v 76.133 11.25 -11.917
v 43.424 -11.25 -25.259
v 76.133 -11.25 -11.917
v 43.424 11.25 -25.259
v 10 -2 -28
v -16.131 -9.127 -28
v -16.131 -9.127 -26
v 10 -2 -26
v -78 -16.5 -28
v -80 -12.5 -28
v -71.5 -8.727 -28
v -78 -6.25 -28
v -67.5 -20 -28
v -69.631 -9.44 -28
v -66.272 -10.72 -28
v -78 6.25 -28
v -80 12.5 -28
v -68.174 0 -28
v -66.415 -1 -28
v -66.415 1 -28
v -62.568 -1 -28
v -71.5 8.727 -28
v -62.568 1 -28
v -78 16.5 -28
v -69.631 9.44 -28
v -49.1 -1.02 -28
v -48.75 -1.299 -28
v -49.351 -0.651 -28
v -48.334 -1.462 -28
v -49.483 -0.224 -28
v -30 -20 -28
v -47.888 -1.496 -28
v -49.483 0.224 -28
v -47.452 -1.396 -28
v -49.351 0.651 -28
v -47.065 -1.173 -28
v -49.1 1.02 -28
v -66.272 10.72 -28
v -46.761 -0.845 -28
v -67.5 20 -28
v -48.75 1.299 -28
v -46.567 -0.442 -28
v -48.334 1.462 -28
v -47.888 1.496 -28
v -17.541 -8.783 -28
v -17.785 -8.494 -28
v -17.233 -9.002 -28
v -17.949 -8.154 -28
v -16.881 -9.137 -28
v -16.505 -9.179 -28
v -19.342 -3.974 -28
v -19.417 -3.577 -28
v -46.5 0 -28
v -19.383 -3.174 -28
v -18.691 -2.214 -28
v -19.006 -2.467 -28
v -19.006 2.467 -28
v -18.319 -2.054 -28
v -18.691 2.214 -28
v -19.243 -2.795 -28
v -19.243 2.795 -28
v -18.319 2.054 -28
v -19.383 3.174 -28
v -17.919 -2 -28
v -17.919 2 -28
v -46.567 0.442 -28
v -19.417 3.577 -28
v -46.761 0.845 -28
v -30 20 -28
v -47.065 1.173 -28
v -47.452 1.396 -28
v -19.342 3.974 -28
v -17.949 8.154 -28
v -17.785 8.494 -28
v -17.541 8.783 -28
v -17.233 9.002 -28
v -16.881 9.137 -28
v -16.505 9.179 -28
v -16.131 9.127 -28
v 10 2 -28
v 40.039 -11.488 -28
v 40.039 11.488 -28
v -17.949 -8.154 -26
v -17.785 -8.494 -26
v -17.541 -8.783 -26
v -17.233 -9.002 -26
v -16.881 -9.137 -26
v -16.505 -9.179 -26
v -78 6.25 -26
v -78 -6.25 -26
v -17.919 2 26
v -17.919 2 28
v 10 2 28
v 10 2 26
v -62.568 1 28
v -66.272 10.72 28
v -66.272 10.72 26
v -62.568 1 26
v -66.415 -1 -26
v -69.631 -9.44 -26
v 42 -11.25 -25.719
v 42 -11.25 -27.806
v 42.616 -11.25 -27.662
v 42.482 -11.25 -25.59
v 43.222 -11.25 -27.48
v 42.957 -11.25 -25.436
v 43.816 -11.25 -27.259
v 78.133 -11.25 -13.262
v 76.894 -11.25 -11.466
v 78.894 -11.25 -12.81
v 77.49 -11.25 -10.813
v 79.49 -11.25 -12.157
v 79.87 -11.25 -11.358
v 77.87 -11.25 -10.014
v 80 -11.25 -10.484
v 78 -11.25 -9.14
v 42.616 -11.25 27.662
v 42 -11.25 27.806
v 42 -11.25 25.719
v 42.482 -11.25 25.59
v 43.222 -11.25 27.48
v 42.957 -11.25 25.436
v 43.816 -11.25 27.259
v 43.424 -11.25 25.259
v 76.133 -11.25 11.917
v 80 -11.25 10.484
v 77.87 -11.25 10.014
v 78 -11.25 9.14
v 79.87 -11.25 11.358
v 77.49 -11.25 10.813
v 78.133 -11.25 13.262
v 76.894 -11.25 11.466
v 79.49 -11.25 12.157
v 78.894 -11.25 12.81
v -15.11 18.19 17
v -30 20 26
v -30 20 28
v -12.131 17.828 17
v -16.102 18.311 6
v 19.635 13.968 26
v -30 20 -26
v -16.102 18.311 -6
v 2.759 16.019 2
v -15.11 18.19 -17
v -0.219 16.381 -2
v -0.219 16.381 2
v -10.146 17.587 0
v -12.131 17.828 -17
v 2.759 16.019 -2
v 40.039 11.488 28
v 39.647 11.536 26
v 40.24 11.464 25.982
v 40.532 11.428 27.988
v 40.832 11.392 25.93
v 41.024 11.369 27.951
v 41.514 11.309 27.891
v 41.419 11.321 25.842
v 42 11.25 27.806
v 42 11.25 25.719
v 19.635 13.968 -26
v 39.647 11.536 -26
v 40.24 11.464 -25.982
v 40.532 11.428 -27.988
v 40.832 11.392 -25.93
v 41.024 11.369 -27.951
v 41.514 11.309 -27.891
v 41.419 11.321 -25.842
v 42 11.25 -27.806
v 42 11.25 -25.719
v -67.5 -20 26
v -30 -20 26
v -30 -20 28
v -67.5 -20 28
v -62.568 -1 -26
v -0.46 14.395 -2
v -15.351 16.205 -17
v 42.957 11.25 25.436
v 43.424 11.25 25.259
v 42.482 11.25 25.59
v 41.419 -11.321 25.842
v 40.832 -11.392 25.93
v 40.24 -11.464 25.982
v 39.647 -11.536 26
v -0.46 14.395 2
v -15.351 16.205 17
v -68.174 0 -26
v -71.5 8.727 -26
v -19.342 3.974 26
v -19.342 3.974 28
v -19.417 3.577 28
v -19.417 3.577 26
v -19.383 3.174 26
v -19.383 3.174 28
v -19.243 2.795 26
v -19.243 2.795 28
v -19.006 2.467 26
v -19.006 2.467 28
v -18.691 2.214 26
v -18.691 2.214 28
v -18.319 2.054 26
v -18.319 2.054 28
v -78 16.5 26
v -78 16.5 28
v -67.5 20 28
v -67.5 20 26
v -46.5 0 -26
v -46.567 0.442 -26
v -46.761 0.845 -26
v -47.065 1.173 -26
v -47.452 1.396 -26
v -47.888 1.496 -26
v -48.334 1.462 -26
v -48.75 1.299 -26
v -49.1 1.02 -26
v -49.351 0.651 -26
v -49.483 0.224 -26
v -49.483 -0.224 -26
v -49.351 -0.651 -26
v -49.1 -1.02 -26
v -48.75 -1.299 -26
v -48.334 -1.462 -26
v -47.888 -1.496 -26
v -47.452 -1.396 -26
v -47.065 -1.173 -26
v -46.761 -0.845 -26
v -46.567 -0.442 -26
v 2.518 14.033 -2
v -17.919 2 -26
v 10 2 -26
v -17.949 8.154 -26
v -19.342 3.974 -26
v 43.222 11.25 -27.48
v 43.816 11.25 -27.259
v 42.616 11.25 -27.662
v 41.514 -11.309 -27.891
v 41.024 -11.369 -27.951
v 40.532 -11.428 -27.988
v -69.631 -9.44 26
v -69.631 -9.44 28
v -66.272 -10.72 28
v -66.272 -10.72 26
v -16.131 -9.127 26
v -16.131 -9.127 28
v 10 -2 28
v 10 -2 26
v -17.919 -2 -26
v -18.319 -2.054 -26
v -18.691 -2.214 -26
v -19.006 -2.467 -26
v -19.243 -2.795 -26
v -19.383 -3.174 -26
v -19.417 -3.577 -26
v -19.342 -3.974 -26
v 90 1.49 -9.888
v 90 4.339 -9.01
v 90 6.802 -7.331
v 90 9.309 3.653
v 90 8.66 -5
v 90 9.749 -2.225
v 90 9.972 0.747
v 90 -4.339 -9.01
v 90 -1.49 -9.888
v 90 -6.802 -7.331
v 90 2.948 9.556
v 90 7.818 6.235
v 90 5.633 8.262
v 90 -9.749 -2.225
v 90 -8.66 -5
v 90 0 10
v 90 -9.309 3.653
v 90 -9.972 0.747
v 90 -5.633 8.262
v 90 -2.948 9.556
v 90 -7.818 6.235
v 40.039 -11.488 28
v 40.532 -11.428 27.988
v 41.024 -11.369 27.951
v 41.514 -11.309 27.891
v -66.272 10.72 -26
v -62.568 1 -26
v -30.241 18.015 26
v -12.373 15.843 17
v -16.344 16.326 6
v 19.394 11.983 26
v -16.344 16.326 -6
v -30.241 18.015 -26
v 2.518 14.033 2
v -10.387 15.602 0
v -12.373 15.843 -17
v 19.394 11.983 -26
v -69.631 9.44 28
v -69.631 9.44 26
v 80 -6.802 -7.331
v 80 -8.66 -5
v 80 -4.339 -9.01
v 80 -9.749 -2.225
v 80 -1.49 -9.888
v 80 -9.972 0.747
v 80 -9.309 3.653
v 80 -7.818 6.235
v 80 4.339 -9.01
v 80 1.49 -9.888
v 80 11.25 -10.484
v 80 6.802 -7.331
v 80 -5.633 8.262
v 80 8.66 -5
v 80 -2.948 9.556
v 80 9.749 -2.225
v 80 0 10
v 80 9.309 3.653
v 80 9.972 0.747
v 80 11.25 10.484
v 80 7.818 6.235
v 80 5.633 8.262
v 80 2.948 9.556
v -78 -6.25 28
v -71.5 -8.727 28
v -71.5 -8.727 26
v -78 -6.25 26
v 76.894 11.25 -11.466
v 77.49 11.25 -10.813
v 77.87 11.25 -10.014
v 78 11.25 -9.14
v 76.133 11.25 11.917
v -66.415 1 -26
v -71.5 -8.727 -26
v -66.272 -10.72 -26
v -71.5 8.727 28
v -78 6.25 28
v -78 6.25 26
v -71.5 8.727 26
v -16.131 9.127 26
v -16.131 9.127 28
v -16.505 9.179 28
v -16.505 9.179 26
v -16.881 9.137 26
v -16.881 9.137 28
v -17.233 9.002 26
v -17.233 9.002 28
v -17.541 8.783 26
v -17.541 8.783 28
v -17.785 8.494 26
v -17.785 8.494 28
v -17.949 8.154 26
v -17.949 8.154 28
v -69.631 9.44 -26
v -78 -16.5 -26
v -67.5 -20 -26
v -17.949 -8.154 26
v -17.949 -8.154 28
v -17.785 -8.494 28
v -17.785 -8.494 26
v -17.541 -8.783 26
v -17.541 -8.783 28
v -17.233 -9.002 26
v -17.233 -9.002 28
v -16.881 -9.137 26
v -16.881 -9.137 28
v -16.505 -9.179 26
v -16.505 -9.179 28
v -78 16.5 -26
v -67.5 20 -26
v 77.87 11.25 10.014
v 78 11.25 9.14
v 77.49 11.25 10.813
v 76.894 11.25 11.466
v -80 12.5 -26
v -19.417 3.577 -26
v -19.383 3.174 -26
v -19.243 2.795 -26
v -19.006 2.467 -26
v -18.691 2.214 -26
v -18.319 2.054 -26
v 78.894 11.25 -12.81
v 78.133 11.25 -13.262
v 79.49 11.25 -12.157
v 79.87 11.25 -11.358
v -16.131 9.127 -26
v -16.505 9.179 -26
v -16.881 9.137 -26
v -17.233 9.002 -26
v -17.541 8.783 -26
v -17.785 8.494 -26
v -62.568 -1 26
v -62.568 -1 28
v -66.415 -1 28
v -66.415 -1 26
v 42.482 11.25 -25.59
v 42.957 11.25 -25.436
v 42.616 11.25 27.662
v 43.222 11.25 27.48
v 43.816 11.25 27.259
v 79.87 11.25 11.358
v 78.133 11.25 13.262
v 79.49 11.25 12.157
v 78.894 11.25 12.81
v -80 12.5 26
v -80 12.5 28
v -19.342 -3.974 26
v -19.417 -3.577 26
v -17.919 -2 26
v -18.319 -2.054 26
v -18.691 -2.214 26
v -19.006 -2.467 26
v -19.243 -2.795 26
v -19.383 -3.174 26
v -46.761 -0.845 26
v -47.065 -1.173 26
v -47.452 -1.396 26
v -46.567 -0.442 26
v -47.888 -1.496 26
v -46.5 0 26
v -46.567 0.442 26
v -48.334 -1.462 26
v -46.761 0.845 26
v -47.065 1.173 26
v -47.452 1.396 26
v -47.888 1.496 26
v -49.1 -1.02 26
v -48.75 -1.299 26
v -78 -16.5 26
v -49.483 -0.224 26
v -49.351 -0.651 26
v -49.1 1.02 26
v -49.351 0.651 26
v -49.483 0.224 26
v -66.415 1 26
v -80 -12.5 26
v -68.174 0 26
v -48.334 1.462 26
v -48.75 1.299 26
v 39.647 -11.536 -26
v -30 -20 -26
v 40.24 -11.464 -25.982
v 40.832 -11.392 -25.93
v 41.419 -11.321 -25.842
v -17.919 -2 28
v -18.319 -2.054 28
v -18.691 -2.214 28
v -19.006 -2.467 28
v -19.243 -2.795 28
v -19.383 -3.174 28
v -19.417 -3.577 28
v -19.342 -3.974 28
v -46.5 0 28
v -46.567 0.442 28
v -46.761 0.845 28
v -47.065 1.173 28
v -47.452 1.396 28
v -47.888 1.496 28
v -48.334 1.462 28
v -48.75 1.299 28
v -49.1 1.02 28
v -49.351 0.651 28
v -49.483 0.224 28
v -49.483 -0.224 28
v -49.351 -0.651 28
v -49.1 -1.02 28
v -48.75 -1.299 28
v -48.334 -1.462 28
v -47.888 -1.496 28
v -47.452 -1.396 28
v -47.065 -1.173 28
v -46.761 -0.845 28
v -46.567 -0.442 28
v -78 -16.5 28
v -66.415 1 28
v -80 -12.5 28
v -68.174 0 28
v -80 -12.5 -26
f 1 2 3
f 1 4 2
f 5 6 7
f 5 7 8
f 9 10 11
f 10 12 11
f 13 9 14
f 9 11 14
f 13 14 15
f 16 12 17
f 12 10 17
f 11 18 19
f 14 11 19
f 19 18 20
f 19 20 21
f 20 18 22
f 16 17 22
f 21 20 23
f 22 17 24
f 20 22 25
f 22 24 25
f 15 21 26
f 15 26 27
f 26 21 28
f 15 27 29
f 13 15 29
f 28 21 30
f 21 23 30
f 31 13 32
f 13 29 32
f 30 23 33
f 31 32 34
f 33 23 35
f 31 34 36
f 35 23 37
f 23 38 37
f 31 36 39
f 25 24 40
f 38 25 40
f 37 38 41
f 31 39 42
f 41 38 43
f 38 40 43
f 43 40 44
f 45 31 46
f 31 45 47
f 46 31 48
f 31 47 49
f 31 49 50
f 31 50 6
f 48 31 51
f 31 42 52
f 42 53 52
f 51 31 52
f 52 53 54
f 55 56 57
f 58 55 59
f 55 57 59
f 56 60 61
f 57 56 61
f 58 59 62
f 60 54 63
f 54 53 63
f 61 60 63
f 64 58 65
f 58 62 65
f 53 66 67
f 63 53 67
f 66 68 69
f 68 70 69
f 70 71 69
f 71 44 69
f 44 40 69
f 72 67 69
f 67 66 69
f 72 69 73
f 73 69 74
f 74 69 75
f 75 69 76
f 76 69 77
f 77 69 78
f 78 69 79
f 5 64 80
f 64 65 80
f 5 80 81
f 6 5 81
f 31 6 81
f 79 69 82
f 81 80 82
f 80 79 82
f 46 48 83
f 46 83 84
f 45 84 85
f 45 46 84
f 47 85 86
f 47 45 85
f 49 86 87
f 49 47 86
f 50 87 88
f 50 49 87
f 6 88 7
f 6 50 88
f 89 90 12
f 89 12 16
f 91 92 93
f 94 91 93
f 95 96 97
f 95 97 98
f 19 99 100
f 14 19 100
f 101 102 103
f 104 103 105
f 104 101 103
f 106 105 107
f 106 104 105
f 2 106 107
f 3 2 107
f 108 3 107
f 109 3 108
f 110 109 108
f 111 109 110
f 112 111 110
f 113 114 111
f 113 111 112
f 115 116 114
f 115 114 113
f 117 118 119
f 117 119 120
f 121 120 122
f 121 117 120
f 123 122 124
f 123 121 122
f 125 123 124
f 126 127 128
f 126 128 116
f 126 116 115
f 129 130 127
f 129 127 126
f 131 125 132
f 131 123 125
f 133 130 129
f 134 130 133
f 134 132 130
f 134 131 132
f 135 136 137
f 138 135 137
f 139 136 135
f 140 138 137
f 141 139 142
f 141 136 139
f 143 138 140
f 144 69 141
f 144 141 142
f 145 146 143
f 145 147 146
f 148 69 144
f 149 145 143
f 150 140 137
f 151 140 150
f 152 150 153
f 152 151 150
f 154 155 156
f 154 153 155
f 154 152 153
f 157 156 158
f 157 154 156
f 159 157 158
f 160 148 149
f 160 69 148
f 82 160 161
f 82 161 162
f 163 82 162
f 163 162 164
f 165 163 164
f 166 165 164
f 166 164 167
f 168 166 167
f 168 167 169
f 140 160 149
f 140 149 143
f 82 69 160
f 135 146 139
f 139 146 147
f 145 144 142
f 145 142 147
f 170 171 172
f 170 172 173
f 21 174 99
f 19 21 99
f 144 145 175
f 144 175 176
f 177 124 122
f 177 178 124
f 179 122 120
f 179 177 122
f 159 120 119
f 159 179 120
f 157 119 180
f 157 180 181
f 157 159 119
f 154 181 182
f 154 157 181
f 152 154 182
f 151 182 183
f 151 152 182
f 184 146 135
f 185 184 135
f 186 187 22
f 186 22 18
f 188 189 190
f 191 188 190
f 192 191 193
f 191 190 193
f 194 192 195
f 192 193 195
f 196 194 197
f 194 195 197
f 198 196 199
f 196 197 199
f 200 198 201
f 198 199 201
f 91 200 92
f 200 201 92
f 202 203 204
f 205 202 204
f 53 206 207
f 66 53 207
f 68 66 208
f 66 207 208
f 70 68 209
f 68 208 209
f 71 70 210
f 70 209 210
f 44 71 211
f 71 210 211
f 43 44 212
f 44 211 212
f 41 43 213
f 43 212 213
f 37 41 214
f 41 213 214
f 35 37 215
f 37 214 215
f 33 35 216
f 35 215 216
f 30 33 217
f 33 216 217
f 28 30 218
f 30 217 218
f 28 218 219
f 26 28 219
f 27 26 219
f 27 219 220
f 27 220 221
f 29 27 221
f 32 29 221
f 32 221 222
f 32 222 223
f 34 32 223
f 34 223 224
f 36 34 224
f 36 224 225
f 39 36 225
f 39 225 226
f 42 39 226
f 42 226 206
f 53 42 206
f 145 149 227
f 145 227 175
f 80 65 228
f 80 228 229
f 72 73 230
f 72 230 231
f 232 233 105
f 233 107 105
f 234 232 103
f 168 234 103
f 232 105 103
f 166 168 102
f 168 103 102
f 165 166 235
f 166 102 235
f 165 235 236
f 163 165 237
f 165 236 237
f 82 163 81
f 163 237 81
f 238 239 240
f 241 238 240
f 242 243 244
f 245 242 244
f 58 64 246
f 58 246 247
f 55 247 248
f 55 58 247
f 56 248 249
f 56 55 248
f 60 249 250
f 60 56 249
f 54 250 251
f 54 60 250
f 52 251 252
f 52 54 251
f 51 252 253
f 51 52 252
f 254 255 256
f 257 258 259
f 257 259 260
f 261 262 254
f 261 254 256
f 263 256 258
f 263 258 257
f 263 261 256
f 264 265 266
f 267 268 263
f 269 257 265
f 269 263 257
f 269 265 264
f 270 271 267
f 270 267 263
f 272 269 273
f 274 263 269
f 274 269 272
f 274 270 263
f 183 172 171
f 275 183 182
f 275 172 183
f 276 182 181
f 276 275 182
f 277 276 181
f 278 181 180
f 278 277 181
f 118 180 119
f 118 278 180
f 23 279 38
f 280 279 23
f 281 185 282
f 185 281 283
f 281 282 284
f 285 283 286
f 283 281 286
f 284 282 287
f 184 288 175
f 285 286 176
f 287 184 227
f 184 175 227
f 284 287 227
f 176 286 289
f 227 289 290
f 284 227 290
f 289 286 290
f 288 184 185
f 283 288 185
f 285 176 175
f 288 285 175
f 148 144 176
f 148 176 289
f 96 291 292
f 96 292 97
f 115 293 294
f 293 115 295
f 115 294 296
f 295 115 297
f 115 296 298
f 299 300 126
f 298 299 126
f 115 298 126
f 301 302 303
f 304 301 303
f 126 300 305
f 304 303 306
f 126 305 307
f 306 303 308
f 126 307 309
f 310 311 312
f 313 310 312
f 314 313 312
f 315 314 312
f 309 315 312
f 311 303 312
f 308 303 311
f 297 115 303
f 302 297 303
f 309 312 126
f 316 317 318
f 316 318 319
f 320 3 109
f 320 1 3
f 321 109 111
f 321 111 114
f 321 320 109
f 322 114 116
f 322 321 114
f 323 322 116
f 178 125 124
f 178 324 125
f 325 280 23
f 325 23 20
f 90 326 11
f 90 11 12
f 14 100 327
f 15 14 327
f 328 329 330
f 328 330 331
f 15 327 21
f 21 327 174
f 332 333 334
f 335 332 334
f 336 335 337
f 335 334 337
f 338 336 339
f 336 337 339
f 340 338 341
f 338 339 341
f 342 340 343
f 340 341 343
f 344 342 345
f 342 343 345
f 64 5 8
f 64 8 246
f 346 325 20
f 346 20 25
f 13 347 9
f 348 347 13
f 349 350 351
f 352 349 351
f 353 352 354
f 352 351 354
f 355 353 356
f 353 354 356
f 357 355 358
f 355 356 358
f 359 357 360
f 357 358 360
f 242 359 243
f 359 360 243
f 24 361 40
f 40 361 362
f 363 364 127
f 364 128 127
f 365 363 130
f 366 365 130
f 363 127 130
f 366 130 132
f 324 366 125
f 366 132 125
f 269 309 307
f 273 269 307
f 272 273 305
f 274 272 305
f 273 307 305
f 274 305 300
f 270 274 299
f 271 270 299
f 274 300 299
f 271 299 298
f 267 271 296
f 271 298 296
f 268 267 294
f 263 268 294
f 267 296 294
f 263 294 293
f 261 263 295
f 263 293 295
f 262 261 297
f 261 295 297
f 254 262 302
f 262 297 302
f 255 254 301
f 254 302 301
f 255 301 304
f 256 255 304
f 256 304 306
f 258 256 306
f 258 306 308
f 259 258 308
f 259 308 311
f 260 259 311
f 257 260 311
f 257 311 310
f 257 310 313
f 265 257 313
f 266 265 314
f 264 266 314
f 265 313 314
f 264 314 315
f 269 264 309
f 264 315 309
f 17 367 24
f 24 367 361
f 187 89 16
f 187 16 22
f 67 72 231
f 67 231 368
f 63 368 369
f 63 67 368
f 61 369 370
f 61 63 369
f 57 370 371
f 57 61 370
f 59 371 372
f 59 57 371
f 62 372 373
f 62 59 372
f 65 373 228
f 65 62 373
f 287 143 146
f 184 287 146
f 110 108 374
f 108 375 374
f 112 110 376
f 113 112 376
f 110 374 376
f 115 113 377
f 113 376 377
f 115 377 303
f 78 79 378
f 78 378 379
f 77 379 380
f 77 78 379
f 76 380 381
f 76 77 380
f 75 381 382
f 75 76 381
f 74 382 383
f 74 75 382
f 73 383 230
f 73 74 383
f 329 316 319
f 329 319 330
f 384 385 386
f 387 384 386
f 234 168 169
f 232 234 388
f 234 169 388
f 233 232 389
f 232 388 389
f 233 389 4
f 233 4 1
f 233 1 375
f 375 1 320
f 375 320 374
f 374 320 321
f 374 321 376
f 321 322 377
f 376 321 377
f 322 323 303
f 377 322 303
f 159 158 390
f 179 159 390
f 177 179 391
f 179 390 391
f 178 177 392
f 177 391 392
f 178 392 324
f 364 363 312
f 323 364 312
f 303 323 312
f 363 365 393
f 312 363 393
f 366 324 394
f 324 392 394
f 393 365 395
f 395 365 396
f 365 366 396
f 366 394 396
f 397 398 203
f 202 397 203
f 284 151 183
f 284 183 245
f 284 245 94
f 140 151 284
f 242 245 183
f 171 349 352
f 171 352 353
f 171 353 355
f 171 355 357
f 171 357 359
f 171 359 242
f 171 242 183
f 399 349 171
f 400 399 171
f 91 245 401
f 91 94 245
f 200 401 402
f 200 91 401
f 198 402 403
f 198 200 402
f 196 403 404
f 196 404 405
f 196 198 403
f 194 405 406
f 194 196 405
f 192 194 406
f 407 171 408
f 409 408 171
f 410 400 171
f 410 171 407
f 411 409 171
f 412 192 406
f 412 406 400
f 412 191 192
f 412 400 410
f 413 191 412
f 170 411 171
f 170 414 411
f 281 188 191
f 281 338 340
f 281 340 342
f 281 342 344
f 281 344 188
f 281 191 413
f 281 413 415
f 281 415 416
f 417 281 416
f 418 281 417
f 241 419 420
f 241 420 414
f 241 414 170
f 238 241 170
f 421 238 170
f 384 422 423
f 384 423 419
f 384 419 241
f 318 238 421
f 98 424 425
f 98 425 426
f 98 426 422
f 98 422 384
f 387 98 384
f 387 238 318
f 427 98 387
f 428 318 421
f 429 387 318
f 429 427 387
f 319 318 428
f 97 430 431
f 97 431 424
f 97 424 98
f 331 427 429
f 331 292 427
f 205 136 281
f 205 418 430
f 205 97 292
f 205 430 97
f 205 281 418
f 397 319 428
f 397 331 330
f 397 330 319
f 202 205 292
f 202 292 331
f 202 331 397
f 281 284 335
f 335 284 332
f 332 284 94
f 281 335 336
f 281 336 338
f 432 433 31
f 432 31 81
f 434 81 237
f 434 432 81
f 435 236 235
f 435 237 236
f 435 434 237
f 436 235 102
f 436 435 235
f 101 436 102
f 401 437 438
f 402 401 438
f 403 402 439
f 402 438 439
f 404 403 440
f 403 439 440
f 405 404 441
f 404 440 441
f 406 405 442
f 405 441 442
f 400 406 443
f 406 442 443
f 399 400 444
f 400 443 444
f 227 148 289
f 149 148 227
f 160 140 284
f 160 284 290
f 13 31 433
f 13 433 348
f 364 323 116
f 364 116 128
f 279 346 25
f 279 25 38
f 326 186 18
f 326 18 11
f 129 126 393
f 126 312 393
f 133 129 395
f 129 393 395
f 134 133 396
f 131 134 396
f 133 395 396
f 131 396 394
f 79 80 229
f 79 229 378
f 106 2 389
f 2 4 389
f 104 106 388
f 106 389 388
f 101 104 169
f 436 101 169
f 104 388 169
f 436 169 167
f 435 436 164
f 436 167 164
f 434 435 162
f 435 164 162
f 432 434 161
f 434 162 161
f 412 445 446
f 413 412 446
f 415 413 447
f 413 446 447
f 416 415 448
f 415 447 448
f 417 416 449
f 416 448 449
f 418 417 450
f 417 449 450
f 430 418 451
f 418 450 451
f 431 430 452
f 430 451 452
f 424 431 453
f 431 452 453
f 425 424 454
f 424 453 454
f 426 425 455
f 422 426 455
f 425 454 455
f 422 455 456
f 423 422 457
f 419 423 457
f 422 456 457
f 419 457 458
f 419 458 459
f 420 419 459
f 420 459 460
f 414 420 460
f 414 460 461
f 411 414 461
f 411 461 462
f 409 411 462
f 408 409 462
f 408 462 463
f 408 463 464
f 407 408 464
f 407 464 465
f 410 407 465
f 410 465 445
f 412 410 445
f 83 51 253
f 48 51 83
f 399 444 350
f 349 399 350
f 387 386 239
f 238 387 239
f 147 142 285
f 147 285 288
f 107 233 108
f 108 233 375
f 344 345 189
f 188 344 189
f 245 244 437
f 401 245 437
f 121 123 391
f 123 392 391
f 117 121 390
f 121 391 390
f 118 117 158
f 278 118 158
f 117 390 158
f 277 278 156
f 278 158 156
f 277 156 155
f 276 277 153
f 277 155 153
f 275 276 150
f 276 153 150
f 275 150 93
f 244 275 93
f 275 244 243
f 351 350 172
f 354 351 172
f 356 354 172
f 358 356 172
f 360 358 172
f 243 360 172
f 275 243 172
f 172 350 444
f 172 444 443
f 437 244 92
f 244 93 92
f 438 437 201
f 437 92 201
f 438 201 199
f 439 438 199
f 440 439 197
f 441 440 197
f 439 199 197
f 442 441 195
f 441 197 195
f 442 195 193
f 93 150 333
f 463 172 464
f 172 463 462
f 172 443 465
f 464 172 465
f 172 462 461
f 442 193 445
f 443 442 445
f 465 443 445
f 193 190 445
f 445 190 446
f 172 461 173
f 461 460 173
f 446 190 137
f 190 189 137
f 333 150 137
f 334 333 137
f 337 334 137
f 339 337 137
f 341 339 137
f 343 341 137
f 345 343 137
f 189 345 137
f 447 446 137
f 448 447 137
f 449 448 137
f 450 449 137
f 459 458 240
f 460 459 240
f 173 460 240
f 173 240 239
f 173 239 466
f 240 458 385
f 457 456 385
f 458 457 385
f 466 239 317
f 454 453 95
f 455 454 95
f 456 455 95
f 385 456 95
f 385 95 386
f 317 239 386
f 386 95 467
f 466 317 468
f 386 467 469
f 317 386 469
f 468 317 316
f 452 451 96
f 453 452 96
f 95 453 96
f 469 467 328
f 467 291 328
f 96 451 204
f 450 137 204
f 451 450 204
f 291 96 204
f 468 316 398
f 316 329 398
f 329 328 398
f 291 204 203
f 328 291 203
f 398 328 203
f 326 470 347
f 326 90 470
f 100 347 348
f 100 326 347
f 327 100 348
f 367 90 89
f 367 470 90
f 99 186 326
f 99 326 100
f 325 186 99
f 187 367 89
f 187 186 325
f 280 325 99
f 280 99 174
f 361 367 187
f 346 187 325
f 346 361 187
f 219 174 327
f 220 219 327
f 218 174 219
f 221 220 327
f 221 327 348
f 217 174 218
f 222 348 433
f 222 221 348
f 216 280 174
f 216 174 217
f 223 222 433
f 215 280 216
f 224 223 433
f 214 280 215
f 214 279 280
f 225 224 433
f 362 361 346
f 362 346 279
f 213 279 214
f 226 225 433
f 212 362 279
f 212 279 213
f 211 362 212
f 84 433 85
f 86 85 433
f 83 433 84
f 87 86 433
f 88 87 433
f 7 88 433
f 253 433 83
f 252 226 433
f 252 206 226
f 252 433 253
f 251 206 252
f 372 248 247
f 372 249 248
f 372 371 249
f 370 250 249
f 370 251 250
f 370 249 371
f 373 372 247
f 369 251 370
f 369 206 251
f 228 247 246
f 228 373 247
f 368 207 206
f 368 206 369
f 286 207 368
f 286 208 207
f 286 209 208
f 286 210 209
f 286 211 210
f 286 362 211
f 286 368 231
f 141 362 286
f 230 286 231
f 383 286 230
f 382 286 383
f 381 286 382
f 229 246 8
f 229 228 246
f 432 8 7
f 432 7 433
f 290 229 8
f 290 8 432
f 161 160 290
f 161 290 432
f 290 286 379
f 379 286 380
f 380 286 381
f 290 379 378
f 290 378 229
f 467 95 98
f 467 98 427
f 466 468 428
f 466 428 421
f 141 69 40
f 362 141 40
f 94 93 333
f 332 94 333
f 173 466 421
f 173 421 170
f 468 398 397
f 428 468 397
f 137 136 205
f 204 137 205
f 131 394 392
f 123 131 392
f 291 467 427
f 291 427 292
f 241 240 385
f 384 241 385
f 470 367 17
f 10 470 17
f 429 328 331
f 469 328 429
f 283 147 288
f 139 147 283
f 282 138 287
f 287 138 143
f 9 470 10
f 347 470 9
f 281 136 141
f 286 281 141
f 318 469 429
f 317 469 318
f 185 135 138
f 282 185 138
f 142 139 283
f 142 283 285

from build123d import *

# Parameters (mm, degrees)
EXTRUDE_1_DEPTH     = 20
SHELL_1_T           = -2
CUT_EXTRUDE_1_DEPTH = 100.679486355
FILLET_1_R          = 10
FILLET_2_R          = 3
SKETCH_3_W          = 50
SKETCH_3_H          = 52
EXTRUDE_2_DEPTH     = 2
SKETCH_4_R          = 10
EXTRUDE_3_DEPTH     = 10
SKETCH_5_R          = 1.5
CUT_EXTRUDE_2_DEPTH = 108.870292481
CUT_EXTRUDE_3_DEPTH = 100.19511746
CUT_EXTRUDE_4_REACH = 109.87
CUT_EXTRUDE_5_DEPTH = 108.870292481


with BuildPart() as part:
    # 草图1 → 凸台-拉伸1 (new, symmetric)
    with BuildSketch(Plane(origin=(0, 0, 0), x_dir=(1, 0, 0), z_dir=(0, 1, 0))):
        Polygon((42, -28), (-80, -28), (-80, 28), (42, 28), (80, 12.5), (80, -12.5), align=None)
    extrude(amount=EXTRUDE_1_DEPTH, both=True)

    # 抽壳1
    shell_1_openings = [part.faces().sort_by_distance(p)[0] for p in [
        (-80, 0, 0),
        (-4.737705571, -20, 0),
        (-4.737705571, 20, 0),
    ]]
    offset(amount=SHELL_1_T, openings=shell_1_openings, kind=Kind.INTERSECTION)

    # 草图2 → 切除-拉伸1 (cut, through all)
    with BuildSketch(Plane.XY.offset(28)):
        Polygon((-80, 12.5), (-78, 16.5), (-67.5, 20), (-80, 20), align=None)
        Polygon((-80, -12.5), (-78, -16.5), (-67.5, -20), (-80, -20), align=None)
        Polygon((-30, 20), (42, 11.25), (80, 11.25), (80, 20), align=None)
        Polygon((42, -11.25), (80, -11.25), (80, -20), (-30, -20), align=None)
    extrude(amount=-CUT_EXTRUDE_1_DEPTH, mode=Mode.SUBTRACT)

    # 圆角1
    fillet_1_edges = [part.edges().sort_by_distance(p)[0] for p in [
        (41.607791612, 0, 26),
        (41.607791612, 0, -26),
    ]]
    fillet(fillet_1_edges, radius=FILLET_1_R)
    fillet_1_2_edges = [part.edges().sort_by_distance(p)[0] for p in [
        (42, 0, -28),
        (42, 0, 28),
    ]]
    fillet(fillet_1_2_edges, radius=FILLET_1_R)

    # 圆角2
    fillet_2_edges = [part.edges().sort_by_distance(p)[0] for p in [
        (78, 0, 11.155809736),
        (78, 0, -11.155809736),
        (80, 0, 12.5),
        (80, 0, -12.5),
    ]]
    fillet(fillet_2_edges, radius=FILLET_2_R)

    # 草图3 → 凸台-拉伸2 (add)
    with BuildSketch(Plane(origin=(1.958559565, 16.116147275, 0), x_dir=(0.9926963020144297, -0.12064017559203144, 0), z_dir=(0.12064017559203145, 0.9926963020144298, 0))):
        with Locations((-7.193692572, 0)):
            Rectangle(SKETCH_3_W, SKETCH_3_H)
    extrude(amount=-EXTRUDE_2_DEPTH)

    # 草图4 → 凸台-拉伸3 (add)
    with BuildSketch(Plane(origin=(80, 0, 0), x_dir=(0, 0, -1), z_dir=(1, 0, 0))):
        Circle(SKETCH_4_R)
    extrude(amount=EXTRUDE_3_DEPTH)

    # 草图5 → 切除-拉伸2 (cut, through all)
    with BuildSketch(Plane.XY.offset(28)):
        with Locations((-48, 0)):
            Circle(SKETCH_5_R)
    extrude(amount=-CUT_EXTRUDE_2_DEPTH, mode=Mode.SUBTRACT)

    # 草图6 → 切除-拉伸3 (cut, through all)
    with BuildSketch(Plane(origin=(1.958559565, 16.116147275, 0), x_dir=(0.9926963020144297, -0.12064017559203144, 0), z_dir=(0.12064017559203145, 0.9926963020144298, 0))):
        Polygon((-18.193692572, -6), (-18.193692572, 6), (-12.193692572, 0), align=None)
        Polygon((-2.193692572, 2), (-17.193692572, 17), (-14.193692572, 17), (0.806307428, 2), align=None)
        Polygon((-14.193692572, -17), (0.806307428, -2), (-2.193692572, -2), (-17.193692572, -17), align=None)
    extrude(amount=-CUT_EXTRUDE_3_DEPTH, mode=Mode.SUBTRACT)

    # 草图7 → 切除-拉伸4 (cut, up to next)
    with BuildSketch(Plane.XY.offset(28), mode=Mode.PRIVATE) as cut_extrude_4_sk1:
        with BuildLine():
            Line((-17.91886117, 2), (10, 2))
            Line((10, 2), (-16.131019724, 9.126641743))
            ThreePointArc((-16.131019724, 9.126641743), (-17.233482721, 9.002007909), (-17.94872078, 8.15383766))
            Line((-17.94872078, 8.15383766), (-19.341886117, 3.974341649))
            ThreePointArc((-19.341886117, 3.974341649), (-19.135724448, 2.622934573), (-17.91886117, 2))
        make_face()
    cut_extrude_4_tool1 = extrude(cut_extrude_4_sk1.sketch, amount=-CUT_EXTRUDE_4_REACH, mode=Mode.PRIVATE) & part.part
    # 草图7 → 切除-拉伸4 (cut, up to next)
    with BuildSketch(Plane.XY.offset(28), mode=Mode.PRIVATE) as cut_extrude_4_sk2:
        with BuildLine():
            Line((-19.341886117, -3.974341649), (-17.94872078, -8.15383766))
            ThreePointArc((-17.94872078, -8.15383766), (-17.233482721, -9.002007909), (-16.131019724, -9.126641743))
            Line((-16.131019724, -9.126641743), (10, -2))
            Line((10, -2), (-17.91886117, -2))
            ThreePointArc((-17.91886117, -2), (-19.135724448, -2.622934573), (-19.341886117, -3.974341649))
        make_face()
    cut_extrude_4_tool2 = extrude(cut_extrude_4_sk2.sketch, amount=-CUT_EXTRUDE_4_REACH, mode=Mode.PRIVATE) & part.part
    cut_extrude_4_1 = cut_extrude_4_tool1.solids().sort_by_distance((-9.044619, 4.500562, 28))[0]
    add(cut_extrude_4_1, mode=Mode.SUBTRACT)
    cut_extrude_4_2 = cut_extrude_4_tool2.solids().sort_by_distance((-9.044619, -4.500562, 28))[0]
    add(cut_extrude_4_2, mode=Mode.SUBTRACT)
    cut_extrude_4 = cut_extrude_4_1 + cut_extrude_4_2  # 切除-拉伸4 as one shape, for the pattern or mirror that repeats it

    # 镜向1: 切除-拉伸4 across plane
    add(cut_extrude_4.mirror(Plane.XY), mode=Mode.SUBTRACT)

    # 草图8 → 切除-拉伸5 (cut, through all)
    with BuildSketch(Plane.XY.offset(28)):
        Polygon((-78, -6.25), (-78, 6.25), (-71.5, 8.727285854), (-68.173848955, 0), (-71.5, -8.727285854), align=None)
        Polygon((-66.414639843, 1), (-69.631129323, 9.43955153), (-66.272202597, 10.719708709), (-62.56781846, 1), align=None)
        Polygon((-66.272202597, -10.719708709), (-62.56781846, -1), (-66.414639843, -1), (-69.631129323, -9.43955153), align=None)
    extrude(amount=-CUT_EXTRUDE_5_DEPTH, mode=Mode.SUBTRACT)


solid = part.part
